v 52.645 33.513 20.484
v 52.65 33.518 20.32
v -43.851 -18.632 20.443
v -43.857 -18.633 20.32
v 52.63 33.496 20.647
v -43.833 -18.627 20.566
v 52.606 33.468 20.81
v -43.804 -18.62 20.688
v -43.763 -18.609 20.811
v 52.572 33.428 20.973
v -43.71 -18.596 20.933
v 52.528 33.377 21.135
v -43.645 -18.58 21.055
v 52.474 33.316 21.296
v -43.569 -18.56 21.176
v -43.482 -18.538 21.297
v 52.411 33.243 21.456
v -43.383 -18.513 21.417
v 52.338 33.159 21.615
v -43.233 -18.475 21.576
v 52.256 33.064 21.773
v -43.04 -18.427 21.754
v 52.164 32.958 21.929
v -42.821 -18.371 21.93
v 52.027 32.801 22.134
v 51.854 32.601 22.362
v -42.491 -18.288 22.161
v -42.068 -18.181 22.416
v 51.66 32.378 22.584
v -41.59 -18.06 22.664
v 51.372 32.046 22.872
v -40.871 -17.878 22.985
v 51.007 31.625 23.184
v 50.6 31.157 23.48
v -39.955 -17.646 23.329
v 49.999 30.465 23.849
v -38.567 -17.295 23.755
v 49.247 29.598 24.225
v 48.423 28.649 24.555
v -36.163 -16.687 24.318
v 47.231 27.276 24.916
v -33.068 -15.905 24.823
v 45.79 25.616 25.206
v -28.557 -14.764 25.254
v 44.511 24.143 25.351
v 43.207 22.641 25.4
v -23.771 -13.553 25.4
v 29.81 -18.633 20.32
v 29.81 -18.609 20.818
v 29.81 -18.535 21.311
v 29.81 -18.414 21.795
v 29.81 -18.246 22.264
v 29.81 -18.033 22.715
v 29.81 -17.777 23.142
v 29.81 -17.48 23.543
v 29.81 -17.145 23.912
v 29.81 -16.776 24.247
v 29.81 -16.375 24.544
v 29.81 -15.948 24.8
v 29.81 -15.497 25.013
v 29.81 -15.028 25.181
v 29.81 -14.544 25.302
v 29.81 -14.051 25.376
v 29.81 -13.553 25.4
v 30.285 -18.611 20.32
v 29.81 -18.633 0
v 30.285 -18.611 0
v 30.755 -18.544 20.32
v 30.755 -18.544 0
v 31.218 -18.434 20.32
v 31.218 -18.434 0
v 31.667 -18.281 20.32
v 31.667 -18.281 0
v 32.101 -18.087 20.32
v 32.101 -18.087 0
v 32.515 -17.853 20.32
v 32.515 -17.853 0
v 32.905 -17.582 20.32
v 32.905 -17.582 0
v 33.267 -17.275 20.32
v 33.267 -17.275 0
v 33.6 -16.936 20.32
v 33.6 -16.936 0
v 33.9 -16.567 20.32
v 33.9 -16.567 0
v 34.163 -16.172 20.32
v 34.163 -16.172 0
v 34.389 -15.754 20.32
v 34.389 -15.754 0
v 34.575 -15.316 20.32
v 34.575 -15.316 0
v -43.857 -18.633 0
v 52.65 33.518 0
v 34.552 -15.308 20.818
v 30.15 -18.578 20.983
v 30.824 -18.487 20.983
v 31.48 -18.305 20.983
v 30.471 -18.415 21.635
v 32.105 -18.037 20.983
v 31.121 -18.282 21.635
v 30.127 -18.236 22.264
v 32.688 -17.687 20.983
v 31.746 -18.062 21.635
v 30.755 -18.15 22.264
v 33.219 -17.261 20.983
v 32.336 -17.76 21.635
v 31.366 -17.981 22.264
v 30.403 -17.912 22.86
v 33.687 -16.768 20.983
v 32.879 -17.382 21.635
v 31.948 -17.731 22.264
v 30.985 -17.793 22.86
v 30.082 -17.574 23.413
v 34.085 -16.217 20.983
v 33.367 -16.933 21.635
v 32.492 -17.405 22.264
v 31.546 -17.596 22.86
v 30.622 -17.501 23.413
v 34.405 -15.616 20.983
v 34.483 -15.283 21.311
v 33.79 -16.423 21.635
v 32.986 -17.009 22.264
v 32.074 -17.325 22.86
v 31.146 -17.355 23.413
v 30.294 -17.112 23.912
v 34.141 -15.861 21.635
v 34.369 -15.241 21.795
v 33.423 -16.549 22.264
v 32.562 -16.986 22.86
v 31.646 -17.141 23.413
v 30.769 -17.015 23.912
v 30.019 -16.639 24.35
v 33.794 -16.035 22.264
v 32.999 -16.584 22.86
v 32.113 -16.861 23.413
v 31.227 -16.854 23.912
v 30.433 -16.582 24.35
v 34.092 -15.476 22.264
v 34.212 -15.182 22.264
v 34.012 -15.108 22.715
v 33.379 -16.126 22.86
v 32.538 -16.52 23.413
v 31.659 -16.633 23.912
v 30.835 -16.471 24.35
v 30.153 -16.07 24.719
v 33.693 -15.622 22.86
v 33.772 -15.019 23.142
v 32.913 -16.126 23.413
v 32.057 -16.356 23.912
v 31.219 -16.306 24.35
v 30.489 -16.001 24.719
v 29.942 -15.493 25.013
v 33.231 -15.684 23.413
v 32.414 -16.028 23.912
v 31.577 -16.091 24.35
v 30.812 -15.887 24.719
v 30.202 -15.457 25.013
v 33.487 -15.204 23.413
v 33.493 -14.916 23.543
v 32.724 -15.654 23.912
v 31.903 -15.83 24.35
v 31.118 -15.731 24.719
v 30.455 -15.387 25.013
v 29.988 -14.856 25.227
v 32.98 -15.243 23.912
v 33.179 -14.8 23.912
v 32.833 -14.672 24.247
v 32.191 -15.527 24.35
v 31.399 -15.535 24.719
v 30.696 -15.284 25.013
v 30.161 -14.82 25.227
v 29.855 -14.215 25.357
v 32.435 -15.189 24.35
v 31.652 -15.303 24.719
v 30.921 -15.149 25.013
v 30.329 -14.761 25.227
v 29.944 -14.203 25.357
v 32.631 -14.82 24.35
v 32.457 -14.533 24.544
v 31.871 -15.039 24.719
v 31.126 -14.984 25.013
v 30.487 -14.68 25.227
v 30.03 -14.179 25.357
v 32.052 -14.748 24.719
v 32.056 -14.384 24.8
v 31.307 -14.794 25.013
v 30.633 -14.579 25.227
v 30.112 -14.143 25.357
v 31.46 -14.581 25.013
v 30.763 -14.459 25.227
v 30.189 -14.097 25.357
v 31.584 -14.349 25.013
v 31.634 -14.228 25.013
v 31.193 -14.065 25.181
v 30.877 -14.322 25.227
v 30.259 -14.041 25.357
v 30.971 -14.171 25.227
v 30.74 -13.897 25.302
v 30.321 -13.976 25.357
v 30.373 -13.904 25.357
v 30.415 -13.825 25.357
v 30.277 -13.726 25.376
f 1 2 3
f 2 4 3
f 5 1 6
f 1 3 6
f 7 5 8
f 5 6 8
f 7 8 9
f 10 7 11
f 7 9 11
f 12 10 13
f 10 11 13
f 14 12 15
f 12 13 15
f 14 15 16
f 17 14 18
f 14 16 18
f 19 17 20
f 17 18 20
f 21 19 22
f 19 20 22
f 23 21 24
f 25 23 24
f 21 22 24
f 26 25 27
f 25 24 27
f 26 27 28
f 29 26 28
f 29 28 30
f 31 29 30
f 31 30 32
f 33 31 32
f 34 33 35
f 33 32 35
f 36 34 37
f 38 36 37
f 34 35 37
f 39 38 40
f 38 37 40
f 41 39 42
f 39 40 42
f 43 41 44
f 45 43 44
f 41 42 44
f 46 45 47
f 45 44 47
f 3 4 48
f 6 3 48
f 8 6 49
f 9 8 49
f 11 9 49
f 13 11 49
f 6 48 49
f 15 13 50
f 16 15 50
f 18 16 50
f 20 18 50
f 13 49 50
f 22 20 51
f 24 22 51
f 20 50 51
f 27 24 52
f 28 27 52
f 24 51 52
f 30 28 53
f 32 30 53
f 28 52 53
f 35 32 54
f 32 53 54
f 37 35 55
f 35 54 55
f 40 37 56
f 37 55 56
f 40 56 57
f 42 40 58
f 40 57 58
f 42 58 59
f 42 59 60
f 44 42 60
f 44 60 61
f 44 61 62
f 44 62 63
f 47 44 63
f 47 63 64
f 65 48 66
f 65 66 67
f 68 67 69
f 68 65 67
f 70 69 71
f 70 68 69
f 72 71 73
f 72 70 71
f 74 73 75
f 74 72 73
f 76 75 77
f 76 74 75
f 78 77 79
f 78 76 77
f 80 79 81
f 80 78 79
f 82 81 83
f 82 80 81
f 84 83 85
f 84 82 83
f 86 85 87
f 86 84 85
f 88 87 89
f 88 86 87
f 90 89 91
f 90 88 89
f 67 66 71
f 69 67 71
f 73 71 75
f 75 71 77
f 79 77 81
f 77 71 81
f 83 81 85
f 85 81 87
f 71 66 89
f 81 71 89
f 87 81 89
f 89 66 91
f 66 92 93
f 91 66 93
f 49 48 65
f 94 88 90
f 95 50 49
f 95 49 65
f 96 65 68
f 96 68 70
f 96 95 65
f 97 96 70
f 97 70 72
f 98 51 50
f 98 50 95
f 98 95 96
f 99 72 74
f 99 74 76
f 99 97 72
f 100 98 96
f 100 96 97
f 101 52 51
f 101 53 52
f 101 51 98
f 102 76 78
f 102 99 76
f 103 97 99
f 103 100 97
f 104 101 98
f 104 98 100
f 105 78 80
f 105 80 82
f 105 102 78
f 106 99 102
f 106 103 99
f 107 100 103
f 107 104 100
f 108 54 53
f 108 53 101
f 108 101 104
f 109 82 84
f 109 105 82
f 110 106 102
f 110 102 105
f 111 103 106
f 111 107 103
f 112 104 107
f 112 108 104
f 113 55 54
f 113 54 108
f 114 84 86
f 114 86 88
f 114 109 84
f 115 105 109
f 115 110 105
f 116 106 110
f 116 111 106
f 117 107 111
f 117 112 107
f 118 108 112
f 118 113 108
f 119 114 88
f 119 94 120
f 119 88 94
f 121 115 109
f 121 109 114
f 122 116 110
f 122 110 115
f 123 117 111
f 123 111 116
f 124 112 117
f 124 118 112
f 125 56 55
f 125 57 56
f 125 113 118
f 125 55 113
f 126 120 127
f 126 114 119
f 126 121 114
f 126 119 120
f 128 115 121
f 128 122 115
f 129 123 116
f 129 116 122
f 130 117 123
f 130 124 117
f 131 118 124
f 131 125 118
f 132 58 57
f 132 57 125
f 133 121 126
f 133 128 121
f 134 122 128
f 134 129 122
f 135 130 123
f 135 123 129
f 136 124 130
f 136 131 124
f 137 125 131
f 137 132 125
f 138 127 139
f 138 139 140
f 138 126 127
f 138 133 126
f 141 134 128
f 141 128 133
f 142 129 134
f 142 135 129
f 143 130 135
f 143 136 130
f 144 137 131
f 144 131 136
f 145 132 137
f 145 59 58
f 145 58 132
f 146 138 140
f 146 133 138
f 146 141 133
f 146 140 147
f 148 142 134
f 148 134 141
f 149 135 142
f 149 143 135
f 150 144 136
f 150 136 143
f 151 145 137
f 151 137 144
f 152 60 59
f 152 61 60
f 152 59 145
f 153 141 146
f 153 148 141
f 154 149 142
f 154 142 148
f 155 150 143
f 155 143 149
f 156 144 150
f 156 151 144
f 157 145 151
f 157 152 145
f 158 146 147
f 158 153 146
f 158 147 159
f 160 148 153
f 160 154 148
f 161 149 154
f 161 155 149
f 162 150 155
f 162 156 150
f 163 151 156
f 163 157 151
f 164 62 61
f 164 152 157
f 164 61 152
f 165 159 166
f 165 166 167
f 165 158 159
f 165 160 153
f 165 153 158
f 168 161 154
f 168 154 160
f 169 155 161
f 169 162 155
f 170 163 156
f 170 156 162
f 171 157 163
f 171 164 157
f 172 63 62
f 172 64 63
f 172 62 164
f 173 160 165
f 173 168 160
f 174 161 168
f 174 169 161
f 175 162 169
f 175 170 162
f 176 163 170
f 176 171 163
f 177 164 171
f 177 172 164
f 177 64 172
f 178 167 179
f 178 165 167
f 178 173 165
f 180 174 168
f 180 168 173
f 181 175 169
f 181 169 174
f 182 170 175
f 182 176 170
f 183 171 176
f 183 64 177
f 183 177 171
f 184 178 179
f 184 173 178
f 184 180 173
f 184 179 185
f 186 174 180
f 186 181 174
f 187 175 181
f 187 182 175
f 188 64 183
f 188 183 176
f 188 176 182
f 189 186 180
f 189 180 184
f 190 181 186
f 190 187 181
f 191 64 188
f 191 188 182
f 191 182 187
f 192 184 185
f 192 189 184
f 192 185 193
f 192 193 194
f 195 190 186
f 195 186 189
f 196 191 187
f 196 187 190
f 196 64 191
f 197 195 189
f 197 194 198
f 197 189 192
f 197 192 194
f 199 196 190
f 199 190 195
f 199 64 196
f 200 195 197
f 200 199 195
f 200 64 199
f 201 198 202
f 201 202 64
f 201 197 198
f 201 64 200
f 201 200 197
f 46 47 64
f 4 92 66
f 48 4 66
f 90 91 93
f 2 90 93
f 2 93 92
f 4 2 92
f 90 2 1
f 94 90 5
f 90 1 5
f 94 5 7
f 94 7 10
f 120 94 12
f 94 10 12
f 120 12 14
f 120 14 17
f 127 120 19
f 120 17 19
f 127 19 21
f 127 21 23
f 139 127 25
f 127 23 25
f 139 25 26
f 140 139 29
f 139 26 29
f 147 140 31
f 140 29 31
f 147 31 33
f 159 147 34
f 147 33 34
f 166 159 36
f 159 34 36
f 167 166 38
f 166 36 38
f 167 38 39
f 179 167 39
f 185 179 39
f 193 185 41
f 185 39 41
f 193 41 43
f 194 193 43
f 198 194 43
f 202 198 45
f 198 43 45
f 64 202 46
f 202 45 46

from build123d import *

# Parameters (mm, degrees)
F1_DEPTH = 25.4
F2_R     = 5.08
F3_R     = 5.08


with BuildPart() as f1:
    # F0 (on Top) → F1 (new body)
    with BuildSketch(Plane.XY):
        Polygon((52.649982, 33.518303), (-43.856528, -18.63311), (33.346899, -18.63311), align=None)
    extrude(amount=F1_DEPTH)

    # F2
    f2_edges = [f1.edges().sort_by_distance(p)[0] for p in [
        (33.346899, -18.63311, 12.7),
    ]]
    fillet(f2_edges, radius=F2_R)

    # F3
    f3_edges = [f1.edges().sort_by_distance(p)[0] for p in [
        (-7.023078, -18.63311, 25.4),
        (32.712825, -17.722303, 25.4),
        (4.396727, 7.442596, 25.4),
        (43.612241, 9.10091, 25.4),
    ]]
    fillet(f3_edges, radius=F3_R)


solid = f1.part
